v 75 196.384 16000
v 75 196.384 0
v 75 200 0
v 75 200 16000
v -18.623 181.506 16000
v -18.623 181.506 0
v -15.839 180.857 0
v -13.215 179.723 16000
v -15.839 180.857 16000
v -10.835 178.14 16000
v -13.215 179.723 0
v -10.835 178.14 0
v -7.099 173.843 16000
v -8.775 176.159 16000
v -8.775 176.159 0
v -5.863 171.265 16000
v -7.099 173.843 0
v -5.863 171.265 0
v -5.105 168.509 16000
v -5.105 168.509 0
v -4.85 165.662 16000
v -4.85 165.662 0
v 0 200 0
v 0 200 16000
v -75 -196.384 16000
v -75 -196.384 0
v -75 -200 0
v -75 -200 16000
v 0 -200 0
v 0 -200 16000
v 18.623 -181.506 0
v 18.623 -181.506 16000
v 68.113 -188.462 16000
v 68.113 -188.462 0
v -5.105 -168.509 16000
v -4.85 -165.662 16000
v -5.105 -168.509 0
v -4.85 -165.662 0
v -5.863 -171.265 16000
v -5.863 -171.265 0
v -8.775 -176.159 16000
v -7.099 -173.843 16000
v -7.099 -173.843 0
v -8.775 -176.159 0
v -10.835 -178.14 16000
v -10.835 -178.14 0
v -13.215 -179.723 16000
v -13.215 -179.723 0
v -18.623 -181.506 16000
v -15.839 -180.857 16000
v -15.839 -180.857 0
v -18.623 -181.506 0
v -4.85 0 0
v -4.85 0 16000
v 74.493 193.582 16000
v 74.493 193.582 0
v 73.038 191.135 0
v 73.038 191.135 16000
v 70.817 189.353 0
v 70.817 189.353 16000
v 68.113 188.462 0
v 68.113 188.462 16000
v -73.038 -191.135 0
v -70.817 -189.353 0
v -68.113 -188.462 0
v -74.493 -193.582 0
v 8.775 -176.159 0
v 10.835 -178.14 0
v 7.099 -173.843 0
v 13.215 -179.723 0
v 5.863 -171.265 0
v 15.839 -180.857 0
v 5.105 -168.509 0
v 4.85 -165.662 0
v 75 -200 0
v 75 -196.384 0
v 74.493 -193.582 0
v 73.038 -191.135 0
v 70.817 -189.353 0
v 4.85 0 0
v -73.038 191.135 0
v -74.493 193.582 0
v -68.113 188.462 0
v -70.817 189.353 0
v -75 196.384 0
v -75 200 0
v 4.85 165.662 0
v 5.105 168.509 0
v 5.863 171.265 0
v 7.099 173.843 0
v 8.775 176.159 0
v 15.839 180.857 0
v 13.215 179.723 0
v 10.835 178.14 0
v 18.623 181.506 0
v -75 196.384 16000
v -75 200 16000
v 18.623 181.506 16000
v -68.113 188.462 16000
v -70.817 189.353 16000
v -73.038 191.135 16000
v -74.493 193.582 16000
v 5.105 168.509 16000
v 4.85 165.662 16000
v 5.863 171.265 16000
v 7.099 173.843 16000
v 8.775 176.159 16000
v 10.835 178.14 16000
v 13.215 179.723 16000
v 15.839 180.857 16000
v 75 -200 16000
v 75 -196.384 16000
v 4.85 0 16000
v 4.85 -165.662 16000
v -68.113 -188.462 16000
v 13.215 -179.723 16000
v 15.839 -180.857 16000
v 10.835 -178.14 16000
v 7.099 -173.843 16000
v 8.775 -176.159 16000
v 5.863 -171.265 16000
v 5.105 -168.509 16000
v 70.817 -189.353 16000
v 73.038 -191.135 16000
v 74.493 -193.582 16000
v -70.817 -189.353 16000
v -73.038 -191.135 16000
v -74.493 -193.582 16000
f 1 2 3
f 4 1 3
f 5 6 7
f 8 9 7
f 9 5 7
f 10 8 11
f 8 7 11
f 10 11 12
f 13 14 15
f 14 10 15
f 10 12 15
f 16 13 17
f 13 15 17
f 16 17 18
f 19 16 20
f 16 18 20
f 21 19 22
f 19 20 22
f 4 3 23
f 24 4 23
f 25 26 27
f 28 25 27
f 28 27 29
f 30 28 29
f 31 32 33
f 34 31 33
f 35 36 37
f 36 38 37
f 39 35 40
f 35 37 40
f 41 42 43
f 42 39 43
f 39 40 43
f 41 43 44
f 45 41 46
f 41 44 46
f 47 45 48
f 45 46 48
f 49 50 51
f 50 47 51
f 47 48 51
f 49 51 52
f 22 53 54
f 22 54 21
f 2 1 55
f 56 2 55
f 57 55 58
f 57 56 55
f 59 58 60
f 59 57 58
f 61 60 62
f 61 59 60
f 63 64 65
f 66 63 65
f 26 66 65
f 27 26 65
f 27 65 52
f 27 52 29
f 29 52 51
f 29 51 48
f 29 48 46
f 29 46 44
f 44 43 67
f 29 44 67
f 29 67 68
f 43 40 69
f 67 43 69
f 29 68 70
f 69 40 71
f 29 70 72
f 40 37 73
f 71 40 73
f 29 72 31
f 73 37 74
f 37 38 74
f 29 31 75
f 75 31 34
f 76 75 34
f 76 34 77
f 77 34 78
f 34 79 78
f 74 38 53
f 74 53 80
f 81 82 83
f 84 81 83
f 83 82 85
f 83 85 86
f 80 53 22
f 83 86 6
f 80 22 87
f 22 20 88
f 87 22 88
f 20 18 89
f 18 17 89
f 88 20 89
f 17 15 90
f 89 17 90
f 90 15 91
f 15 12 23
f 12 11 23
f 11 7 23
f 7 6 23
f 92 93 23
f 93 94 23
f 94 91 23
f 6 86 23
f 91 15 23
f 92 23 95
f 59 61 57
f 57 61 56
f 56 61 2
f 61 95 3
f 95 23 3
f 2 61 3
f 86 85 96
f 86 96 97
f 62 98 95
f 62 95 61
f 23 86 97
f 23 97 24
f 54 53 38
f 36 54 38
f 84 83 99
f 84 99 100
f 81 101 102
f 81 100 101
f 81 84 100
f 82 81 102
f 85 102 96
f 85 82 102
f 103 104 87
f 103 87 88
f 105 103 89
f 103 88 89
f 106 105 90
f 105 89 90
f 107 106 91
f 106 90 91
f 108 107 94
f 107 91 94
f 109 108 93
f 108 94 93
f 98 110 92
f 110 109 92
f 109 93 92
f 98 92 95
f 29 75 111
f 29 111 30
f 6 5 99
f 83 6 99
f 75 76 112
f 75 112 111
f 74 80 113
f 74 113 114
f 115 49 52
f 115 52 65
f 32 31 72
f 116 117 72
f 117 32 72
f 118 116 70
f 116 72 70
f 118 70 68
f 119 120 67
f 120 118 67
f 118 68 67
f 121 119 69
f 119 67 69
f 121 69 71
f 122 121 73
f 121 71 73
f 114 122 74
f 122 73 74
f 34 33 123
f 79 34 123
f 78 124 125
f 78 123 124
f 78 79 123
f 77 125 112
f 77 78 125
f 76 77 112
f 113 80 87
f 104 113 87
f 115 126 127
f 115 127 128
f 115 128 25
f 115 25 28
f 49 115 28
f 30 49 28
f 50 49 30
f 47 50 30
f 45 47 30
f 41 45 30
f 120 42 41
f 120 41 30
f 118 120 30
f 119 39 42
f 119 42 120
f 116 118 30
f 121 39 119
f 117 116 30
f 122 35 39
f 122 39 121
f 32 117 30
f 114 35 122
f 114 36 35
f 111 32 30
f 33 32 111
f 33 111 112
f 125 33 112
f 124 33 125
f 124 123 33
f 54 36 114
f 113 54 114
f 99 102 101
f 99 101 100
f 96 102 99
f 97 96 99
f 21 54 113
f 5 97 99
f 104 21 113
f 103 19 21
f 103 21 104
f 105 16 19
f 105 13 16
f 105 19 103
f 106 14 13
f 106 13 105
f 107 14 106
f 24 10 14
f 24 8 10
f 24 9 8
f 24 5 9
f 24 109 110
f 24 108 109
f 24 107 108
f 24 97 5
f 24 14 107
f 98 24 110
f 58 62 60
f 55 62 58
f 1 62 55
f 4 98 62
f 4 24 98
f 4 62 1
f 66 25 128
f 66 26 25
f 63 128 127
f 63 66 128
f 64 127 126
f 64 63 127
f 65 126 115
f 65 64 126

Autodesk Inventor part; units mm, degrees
ref_plane "YZ Plane" through (0, 0, 0) normal (1, 0, 0) x (0, 1, 0)
ref_plane "Startebene" through (0, 0, 0) normal (0, 0, 1) x (1, 0, 0)
ref_plane "Endebene" through (0, 0, 16000) normal (0, 0, 1) x (1, 0, 0)
sketch "Skizze" plane through (0, 0, 0) normal (0, 0, 1) x (1, 0, 0)
  line L0 (-4.85, 0) -> (-4.85, -165.6619)
  line L1 (-18.6232, -181.5062) -> (-68.1134, -188.4616)
  line L2 (-75, -196.3838) -> (-75, -200)
  line L3 (-75, -200) -> (0, -200)
  line L4 (-39.925, -200) -> (-39.925, -184.5) construction
  line L5 (-25.7112, 0) -> (34.2816, 0) construction
  line L6 (0, 40) -> (0, -200) construction
  line L7 (0, -48) -> (0, 64) construction
  line L8 (4.85, 0) -> (4.85, -165.6619)
  line L9 (18.6232, -181.5062) -> (68.1134, -188.4616)
  line L10 (75, -196.3838) -> (75, -200)
  line L11 (75, -200) -> (0, -200)
  line L12 (-4.85, 0) -> (4.85, 0) construction
  line L13 (-4.85, 0) -> (-4.85, 165.6619)
  line L14 (-18.6232, 181.5062) -> (-68.1134, 188.4616)
  line L15 (-75, 196.3838) -> (-75, 200)
  line L16 (-75, 200) -> (0, 200)
  line L17 (4.85, 0) -> (4.85, 165.6619)
  line L18 (18.6232, 181.5062) -> (68.1134, 188.4616)
  line L19 (75, 196.3838) -> (75, 200)
  line L20 (75, 200) -> (0, 200)
  arc A0 (-75, 196.3838) -> (-68.1134, 188.4616) centre (-67, 196.3838) ccw
  arc A1 (68.1134, 188.4616) -> (75, 196.3838) centre (67, 196.3838) ccw
  arc A2 (75, -196.3838) -> (68.1134, -188.4616) centre (67, -196.3838) ccw
  arc A3 (-68.1134, -188.4616) -> (-75, -196.3838) centre (-67, -196.3838) ccw
  arc A4 (-4.85, 165.6619) -> (-18.6232, 181.5062) centre (-20.85, 165.6619) ccw
  arc A5 (18.6232, 181.5062) -> (4.85, 165.6619) centre (20.85, 165.6619) ccw
  arc A6 (4.85, -165.6619) -> (18.6232, -181.5062) centre (20.85, -165.6619) ccw
  arc A7 (-18.6232, -181.5062) -> (-4.85, -165.6619) centre (-20.85, -165.6619) ccw
  line L21 (0, 280) -> (0, -280) construction
  line L22 (-107.0734, 0) -> (107.0734, 0) construction
  point P0 (-4.85, -179.5705)
  point P1 (-75, -189.4295)
  point P2 (4.85, -179.5705)
  point P3 (75, -189.4295)
  point P4 (39.925, -200)
  point P5 (39.925, -184.5)
  point P6 (-4.85, 179.5705)
  point P7 (-75, 189.4295)
  point P8 (-39.925, 200)
  point P9 (-39.925, 184.5)
  point P10 (4.85, 179.5705)
  point P11 (75, 189.4295)
  point P12 (39.925, 184.5)
  point P13 (39.925, 200)
  dimension "d1" = 4.9295
  dimension "d2" = 15.5
  dimension "d3" = 35.075
  dimension "d4" = 4.85
  dimension "d5" = 75
  dimension "d10" = 200
  dimension "d14" = 8
  dimension "d15" = 16
extrude "Körper" add sketch "Skizze" along normal up to surface (16000 mm away) from surface at 0
sketch "Sketch3" plane through (0, 0, 0) normal (0, 0, 1) x (1, 0, 0)
  line L0 (0, 0) -> (10, 0)
ref_plane "Work Plane3" through (0, 0, 0) normal (0, -1, 0) x (1, 0, 0)
sketch "Sketch4" plane through (0, 0, 0) normal (0, -1, 0) x (1, 0, 0)
  line L0 (-2, 0) -> (12, 0)
  line L1 (-2, 16000) -> (12, 16000)
  dimension "d19" = 16000
equation "\"d2\" = G_T1"
equation "\"d3\" = G_C"
equation "\"d4\" = 0.5 * G_T"
equation "\"d5\" = 0.5 * G_W"
equation "\"d10\" = 0.5 * G_H"
equation "\"d14\" = G_ER"
equation "\"d15\" = G_IR"
equation "\"d6\" = G_L"
equation "\"G_W\" = 150"
equation "\"G_H\" = 400"
equation "\"G_T\" = 9.7"
equation "\"G_T1\" = 15.5"
equation "\"G_C\" = 35.075"
equation "\"G_NG\" = 0.140541"
equation "\"G_L\" = d19"
equation "\"G_ER\" = 0.5 * G_IR"
equation "\"G_IR\" = 16"
equation "\"G_OFFSET_START\" = 0"
equation "\"G_OFFSET_END\" = 0"
equation "\"d17\" = G_OFFSET_END + B_L"
equation "\"B_L\" = 16000"
properties part number "ISO 657/15 - SB 400x66 - 16000" material "Stahl, weich"
